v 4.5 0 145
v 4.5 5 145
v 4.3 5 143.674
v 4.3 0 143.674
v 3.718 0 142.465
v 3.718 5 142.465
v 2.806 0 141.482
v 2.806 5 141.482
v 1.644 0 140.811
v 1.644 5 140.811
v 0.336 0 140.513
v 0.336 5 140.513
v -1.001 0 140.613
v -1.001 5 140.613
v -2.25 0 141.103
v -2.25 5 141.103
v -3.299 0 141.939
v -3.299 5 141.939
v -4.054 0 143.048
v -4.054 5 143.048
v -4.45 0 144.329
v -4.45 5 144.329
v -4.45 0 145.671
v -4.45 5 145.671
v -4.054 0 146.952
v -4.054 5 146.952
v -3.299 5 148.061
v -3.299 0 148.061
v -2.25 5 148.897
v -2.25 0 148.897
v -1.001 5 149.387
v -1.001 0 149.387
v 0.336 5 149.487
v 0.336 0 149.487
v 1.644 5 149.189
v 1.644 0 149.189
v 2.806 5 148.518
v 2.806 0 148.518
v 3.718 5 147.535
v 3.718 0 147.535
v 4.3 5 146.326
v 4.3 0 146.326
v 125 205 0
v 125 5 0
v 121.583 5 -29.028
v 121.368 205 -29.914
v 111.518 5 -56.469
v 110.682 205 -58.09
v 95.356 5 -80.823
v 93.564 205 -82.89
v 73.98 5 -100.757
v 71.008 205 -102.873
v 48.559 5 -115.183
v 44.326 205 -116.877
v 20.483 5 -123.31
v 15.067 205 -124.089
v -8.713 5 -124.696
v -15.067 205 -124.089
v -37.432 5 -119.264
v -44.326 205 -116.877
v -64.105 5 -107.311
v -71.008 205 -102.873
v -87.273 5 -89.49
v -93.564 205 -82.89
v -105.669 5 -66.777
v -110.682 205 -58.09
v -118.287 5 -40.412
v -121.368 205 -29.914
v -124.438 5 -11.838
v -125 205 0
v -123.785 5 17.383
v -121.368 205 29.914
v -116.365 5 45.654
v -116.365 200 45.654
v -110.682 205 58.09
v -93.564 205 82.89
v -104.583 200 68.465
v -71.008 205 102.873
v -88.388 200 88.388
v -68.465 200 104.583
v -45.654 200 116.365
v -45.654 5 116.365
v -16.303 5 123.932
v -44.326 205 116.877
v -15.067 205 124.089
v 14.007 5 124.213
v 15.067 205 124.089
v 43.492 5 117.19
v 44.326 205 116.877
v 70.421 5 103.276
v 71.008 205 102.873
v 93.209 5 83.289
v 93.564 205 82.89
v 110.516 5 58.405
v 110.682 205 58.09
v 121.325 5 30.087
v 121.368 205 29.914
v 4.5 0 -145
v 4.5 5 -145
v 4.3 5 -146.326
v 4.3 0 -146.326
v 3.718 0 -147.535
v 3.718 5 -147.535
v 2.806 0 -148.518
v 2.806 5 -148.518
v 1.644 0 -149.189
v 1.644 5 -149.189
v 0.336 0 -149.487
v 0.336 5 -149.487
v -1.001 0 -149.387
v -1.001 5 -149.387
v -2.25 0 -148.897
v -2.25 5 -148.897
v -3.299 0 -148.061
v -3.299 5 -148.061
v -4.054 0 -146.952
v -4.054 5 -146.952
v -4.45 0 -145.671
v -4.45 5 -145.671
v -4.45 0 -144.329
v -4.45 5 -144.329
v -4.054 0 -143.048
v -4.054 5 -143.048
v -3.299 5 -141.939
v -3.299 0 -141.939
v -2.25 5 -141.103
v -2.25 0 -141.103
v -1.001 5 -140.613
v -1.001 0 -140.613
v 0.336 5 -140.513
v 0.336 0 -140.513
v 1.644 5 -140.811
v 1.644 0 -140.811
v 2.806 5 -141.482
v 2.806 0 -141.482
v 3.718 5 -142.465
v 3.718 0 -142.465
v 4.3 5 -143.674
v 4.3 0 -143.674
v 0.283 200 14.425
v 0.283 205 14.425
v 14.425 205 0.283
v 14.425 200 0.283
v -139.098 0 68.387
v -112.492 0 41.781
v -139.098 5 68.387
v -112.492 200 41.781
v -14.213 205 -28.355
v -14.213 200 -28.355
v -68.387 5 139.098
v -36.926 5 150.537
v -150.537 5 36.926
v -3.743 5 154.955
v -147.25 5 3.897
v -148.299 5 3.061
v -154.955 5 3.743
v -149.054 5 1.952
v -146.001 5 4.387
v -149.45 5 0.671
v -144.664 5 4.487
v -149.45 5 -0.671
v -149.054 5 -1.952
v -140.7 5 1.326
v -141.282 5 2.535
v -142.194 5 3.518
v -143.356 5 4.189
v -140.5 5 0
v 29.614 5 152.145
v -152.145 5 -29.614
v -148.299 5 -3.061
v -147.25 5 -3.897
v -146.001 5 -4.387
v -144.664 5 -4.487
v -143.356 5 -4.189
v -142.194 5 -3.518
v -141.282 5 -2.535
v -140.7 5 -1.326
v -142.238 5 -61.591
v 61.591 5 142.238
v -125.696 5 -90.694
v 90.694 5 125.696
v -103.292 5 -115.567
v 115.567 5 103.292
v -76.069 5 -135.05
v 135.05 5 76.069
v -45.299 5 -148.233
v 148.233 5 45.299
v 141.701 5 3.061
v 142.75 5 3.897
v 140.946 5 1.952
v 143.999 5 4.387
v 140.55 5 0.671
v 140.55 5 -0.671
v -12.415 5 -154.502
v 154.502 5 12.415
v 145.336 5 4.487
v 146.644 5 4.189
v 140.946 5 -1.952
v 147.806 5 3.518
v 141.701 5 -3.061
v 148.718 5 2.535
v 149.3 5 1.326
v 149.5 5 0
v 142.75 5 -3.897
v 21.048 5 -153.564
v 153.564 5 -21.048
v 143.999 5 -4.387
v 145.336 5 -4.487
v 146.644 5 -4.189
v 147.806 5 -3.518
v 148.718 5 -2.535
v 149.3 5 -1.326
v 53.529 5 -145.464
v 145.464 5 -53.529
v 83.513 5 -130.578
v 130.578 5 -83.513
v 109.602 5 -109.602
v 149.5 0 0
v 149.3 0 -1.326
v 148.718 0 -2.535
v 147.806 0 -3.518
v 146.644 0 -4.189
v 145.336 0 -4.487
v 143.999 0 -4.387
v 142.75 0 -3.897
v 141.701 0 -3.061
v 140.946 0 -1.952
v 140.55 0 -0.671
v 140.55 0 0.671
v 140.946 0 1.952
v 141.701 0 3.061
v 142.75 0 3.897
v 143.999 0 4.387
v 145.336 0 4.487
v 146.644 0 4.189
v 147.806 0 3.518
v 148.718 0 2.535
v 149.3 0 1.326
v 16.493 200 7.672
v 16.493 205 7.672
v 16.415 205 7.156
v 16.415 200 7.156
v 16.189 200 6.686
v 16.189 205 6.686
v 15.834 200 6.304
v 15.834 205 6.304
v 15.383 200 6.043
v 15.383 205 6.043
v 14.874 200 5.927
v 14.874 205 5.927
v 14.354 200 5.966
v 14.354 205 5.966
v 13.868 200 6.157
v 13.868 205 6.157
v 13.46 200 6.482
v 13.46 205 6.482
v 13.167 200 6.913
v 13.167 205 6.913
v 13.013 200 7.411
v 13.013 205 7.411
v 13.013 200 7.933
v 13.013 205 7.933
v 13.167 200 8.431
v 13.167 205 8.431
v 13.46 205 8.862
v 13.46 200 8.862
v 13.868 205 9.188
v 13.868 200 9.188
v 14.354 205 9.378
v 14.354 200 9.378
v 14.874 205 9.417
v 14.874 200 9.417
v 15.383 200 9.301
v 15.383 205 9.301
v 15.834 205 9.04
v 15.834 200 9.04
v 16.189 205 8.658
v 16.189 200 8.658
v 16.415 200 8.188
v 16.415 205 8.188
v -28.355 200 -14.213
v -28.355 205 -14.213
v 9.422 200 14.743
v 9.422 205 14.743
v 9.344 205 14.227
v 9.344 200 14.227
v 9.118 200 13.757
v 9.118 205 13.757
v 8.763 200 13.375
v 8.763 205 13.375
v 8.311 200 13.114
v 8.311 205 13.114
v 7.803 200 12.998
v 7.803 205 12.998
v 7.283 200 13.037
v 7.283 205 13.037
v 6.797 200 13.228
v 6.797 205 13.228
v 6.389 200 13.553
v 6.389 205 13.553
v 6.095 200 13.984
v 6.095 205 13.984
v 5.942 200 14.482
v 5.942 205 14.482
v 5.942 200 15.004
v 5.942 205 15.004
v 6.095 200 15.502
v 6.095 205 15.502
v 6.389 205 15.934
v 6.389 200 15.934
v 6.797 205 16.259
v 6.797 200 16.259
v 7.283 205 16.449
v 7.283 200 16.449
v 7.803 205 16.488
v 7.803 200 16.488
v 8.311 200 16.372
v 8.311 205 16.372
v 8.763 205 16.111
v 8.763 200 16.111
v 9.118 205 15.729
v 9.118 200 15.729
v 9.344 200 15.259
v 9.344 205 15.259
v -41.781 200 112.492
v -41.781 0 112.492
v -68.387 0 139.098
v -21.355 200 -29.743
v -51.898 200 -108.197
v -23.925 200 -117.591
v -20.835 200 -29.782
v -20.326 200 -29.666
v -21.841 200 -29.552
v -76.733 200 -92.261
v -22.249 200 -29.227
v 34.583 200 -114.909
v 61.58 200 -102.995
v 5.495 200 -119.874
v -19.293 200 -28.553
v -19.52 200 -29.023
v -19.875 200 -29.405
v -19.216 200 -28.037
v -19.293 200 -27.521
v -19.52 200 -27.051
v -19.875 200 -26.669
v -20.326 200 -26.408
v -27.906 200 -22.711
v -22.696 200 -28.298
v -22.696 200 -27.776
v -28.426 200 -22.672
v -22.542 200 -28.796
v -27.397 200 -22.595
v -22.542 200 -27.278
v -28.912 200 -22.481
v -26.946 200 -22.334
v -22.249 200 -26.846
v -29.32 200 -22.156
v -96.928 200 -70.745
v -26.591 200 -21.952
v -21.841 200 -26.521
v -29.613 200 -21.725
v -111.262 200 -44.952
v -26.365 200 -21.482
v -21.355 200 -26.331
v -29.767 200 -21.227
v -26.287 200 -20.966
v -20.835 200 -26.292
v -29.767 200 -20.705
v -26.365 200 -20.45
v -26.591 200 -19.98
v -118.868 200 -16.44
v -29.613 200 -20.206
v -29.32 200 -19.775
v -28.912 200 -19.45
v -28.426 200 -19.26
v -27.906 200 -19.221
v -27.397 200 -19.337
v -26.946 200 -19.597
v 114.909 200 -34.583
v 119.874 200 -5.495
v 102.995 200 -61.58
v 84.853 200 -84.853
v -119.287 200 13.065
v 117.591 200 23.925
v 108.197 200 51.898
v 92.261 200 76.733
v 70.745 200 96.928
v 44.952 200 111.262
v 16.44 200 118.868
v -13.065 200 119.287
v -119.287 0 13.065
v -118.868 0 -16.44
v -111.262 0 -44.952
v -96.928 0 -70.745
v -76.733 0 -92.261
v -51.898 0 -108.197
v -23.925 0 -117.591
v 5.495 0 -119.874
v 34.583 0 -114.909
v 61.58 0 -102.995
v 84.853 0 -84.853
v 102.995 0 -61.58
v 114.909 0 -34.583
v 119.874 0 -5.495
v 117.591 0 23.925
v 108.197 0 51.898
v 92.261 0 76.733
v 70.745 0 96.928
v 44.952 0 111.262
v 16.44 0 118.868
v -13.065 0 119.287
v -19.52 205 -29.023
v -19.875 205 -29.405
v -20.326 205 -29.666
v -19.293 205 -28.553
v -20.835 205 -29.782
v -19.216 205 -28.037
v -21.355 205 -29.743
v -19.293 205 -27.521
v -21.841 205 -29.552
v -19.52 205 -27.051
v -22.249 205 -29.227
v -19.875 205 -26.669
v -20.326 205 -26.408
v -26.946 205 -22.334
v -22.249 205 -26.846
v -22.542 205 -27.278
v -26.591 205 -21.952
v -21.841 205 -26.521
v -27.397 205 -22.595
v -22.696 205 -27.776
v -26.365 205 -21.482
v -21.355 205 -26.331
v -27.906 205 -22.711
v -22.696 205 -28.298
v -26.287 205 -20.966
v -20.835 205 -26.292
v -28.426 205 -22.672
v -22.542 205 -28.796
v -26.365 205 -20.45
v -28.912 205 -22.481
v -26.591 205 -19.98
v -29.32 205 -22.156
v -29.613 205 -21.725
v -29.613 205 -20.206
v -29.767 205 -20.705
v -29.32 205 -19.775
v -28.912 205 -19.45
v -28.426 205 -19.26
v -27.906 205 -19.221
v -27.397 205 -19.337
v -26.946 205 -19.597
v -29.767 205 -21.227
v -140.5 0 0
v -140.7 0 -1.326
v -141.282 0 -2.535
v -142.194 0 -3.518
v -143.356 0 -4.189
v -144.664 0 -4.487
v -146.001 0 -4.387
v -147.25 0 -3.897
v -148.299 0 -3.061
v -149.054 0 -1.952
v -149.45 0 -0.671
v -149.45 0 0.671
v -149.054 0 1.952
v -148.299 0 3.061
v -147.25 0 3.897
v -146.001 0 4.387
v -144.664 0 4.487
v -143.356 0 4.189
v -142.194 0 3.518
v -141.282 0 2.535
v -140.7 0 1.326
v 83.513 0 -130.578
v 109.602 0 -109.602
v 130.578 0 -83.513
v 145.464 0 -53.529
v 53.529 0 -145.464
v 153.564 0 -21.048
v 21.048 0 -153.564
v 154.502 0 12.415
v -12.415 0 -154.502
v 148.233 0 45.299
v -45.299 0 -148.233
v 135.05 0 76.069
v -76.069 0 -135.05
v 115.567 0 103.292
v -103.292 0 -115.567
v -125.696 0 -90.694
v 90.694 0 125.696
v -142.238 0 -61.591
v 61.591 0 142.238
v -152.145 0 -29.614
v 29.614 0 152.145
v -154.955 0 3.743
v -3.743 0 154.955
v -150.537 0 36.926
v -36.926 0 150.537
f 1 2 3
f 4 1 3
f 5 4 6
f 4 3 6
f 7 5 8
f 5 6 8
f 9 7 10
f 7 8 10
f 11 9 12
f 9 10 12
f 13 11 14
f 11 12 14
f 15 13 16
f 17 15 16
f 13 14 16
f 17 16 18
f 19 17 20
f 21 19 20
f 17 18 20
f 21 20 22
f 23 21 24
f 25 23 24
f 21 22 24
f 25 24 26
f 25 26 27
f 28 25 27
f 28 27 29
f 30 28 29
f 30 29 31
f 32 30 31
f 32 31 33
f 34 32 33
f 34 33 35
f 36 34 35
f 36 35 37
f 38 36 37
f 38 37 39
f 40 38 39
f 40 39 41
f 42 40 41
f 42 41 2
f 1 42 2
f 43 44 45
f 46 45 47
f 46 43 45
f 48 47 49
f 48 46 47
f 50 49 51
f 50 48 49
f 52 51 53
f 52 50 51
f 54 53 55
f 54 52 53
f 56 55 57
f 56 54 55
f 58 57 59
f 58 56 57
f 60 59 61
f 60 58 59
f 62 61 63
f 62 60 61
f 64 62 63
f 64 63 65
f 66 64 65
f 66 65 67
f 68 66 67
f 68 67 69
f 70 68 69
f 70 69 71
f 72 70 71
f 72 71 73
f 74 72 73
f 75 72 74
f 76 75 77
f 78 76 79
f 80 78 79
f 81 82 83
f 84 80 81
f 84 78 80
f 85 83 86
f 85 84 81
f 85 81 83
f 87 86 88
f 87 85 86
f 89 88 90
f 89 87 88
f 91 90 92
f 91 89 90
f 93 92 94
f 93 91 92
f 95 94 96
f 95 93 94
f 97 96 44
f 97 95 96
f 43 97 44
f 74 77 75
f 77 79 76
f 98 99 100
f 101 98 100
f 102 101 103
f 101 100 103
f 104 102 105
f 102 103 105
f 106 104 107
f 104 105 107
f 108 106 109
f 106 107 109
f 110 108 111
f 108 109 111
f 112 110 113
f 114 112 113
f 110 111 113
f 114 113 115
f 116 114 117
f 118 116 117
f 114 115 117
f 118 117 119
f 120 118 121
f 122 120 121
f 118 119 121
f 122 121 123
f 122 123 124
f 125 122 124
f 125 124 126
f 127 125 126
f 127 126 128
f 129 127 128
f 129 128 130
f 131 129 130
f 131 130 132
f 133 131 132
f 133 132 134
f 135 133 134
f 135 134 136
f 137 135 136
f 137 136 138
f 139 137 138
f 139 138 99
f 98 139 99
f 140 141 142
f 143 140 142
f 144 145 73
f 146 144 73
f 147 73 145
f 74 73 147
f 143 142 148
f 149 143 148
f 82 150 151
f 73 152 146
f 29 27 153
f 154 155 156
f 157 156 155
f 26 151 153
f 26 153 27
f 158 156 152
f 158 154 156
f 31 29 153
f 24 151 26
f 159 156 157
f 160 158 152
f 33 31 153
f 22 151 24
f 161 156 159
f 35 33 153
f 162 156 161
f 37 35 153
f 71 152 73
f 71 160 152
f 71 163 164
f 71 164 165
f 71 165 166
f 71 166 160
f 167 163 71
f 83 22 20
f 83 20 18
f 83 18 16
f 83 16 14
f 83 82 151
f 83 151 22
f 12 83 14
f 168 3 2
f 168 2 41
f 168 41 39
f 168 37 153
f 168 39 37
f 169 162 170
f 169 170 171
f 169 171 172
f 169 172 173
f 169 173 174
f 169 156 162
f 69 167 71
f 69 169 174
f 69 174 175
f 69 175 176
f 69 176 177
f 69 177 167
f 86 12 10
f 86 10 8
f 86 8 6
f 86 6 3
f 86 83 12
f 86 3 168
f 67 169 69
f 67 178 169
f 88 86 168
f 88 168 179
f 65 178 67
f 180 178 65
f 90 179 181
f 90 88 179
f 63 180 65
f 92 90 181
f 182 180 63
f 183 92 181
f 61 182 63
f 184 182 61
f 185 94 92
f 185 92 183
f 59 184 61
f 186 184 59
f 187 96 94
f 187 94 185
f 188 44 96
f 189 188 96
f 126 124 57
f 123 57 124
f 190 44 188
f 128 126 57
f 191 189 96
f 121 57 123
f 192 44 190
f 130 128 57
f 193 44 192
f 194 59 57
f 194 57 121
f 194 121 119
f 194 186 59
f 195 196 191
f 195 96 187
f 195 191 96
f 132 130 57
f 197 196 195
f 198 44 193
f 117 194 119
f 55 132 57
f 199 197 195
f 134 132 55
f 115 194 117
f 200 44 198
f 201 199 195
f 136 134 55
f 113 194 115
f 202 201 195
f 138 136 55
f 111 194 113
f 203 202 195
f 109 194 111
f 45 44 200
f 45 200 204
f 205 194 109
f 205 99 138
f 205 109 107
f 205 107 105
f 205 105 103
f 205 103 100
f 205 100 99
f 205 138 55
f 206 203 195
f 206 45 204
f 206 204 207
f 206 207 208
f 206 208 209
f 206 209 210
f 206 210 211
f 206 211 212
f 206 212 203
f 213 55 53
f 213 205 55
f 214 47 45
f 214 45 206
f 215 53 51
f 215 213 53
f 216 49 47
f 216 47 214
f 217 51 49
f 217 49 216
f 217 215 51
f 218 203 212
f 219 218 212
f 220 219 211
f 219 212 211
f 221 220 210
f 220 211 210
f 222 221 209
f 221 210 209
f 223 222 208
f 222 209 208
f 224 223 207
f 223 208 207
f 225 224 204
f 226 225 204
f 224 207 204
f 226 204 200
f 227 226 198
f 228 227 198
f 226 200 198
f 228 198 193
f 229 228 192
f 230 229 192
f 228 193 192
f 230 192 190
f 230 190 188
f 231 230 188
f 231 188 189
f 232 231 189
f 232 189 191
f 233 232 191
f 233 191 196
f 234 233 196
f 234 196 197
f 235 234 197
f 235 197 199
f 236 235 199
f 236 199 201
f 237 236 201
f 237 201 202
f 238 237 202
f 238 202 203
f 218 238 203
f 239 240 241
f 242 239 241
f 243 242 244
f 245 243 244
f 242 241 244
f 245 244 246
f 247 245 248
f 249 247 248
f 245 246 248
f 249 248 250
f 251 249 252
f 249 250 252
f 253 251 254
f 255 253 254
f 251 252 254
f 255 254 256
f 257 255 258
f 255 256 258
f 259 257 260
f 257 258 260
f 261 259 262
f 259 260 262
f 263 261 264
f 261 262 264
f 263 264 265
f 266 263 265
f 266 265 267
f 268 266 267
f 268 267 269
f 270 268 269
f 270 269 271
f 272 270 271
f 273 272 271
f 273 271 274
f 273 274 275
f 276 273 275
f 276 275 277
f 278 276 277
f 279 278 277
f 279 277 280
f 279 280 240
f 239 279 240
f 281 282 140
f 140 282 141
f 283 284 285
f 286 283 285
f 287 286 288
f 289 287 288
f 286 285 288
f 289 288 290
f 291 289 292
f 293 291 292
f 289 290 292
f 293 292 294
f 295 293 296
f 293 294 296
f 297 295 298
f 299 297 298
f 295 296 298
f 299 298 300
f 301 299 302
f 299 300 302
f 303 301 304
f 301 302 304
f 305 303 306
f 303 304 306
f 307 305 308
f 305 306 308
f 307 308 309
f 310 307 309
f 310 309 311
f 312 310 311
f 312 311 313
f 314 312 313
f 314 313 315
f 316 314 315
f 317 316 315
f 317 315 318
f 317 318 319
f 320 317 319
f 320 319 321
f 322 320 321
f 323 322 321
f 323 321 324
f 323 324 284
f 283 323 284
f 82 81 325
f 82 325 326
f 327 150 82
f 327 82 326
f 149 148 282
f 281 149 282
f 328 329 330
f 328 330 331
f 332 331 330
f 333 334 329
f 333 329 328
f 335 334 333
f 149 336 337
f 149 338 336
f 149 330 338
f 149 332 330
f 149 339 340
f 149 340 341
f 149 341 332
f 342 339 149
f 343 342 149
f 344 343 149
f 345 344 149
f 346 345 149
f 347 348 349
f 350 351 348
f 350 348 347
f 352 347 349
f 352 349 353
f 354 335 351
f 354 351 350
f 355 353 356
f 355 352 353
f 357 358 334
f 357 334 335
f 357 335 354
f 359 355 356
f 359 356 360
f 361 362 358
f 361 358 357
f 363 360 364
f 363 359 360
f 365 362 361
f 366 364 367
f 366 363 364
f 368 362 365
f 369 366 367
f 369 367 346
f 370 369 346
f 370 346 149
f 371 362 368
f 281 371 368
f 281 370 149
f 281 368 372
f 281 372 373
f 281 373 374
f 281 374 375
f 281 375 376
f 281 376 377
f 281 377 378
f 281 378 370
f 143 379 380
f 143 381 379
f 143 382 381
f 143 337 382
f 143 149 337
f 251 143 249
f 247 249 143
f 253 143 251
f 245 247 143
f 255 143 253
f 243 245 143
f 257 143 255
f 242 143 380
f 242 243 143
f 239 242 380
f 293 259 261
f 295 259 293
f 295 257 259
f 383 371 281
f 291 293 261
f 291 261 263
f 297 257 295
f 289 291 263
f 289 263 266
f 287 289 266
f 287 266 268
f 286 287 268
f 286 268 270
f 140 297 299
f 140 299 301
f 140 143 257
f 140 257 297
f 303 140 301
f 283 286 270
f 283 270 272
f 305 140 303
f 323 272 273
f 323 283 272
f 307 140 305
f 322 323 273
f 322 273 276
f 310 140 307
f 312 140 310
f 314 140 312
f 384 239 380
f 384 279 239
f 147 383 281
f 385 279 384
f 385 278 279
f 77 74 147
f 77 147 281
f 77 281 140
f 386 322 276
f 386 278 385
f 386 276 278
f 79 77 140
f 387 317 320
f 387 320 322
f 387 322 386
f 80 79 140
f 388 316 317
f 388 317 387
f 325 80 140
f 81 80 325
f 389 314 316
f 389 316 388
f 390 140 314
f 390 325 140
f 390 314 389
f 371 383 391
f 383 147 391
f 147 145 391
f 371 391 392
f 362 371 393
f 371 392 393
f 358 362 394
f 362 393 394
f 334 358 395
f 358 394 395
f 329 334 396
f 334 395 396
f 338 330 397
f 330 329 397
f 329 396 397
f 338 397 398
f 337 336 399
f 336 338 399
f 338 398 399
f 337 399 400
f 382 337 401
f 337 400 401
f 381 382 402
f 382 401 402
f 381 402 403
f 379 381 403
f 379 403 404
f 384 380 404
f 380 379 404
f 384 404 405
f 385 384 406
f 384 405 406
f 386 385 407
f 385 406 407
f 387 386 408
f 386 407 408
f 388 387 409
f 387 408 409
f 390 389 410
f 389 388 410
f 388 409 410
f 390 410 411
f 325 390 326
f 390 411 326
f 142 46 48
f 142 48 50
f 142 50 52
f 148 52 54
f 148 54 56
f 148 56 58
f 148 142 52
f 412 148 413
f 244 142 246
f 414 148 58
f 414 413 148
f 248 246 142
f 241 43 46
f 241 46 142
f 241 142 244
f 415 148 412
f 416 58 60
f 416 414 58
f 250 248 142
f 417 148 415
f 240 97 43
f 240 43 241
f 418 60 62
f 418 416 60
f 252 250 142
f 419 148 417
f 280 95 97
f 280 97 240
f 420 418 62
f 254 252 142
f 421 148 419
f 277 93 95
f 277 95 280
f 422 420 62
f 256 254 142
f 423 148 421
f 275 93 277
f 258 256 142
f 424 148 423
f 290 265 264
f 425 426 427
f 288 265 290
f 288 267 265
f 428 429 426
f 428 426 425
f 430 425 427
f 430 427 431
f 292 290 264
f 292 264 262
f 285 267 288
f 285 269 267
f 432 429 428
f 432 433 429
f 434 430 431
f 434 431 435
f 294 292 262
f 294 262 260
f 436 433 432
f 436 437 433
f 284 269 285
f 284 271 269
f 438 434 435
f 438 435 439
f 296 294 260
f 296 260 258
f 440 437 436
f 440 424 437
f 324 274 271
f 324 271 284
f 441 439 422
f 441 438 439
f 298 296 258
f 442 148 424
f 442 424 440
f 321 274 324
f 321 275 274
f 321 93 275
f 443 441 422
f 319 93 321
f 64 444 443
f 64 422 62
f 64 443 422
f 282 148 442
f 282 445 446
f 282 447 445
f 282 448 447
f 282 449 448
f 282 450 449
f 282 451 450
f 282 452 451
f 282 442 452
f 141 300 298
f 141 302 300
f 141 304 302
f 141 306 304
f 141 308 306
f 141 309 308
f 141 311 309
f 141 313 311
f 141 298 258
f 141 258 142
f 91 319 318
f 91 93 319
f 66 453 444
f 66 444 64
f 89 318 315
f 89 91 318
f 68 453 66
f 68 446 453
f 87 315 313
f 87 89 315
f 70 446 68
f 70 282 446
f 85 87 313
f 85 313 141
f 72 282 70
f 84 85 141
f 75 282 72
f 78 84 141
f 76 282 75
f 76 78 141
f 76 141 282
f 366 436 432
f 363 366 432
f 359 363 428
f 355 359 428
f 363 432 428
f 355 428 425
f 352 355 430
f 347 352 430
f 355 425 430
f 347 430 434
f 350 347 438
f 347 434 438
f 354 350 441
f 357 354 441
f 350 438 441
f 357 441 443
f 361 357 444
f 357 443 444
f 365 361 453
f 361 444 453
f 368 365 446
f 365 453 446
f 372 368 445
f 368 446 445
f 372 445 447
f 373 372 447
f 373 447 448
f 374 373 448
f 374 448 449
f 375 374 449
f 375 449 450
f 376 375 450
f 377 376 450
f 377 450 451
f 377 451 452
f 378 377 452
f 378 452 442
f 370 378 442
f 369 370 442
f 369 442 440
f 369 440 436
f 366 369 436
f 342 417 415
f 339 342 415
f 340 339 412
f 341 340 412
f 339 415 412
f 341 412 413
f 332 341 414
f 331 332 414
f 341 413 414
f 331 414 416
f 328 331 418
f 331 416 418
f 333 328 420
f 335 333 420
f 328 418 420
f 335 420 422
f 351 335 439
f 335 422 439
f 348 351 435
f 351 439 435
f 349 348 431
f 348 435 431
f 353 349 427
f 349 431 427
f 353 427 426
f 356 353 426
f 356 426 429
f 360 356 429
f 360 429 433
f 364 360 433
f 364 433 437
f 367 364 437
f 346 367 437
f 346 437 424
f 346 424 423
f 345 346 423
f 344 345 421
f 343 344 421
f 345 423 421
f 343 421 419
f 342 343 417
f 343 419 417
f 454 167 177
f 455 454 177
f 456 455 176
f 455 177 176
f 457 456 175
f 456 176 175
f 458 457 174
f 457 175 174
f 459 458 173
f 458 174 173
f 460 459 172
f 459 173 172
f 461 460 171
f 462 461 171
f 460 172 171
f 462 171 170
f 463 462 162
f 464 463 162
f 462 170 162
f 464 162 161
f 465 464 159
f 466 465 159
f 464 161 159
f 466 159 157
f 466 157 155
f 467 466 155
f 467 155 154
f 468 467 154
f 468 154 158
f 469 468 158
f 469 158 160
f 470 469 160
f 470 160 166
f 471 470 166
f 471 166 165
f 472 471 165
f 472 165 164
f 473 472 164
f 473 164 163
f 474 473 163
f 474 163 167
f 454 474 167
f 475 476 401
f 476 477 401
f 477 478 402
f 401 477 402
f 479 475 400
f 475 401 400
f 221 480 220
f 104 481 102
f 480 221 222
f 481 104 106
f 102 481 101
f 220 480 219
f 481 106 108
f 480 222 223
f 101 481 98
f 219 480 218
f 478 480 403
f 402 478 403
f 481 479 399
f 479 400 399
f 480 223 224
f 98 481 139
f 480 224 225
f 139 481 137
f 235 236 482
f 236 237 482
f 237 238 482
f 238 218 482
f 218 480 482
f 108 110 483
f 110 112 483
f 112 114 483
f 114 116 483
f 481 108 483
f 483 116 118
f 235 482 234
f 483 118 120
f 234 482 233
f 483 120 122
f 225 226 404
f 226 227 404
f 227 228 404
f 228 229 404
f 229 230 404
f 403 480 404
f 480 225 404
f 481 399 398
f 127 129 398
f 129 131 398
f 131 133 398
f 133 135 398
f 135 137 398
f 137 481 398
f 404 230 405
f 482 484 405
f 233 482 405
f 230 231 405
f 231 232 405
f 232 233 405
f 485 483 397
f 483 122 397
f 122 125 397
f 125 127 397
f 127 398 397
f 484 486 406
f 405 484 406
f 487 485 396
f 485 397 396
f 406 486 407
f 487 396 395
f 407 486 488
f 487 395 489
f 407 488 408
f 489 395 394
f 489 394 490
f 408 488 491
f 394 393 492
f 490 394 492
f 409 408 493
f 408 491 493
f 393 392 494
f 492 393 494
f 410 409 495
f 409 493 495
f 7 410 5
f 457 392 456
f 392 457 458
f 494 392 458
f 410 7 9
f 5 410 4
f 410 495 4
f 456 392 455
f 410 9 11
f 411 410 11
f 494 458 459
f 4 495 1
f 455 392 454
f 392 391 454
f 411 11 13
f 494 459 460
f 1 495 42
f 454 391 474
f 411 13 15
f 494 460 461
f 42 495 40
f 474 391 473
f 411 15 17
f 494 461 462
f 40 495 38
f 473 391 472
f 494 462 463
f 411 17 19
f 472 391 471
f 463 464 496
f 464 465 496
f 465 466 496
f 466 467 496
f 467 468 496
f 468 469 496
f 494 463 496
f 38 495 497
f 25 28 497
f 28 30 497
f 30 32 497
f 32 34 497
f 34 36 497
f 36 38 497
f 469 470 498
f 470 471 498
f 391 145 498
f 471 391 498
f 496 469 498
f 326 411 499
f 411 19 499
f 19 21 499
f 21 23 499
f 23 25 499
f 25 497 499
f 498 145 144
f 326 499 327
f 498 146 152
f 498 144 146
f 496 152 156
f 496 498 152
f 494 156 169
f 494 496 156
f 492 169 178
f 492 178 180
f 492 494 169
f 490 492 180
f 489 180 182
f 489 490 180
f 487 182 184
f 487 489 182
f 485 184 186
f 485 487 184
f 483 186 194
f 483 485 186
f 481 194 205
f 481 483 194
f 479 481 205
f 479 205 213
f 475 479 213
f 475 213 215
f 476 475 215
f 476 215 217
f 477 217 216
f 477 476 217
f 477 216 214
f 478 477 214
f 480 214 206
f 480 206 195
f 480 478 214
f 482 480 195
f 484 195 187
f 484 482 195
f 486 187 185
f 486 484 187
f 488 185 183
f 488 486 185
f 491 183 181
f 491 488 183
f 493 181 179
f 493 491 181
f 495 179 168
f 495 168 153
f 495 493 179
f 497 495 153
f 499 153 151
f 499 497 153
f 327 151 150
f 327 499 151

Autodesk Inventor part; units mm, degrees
ref_plane "XZ Plane" through (0, 0, 0) normal (0, 1, 0) x (-1, 0, 0)
ref_plane "XY Plane" through (0, 0, 0) normal (0, 0, 1) x (1, 0, 0)
sketch "Sketch1" plane through (0, 0, 0) normal (0, 1, 0) x (-1, 0, 0)
  circle A0 centre (0, 0) radius 120
  circle A1 centre (0, 0) radius 125
  circle A2 centre (0, 0) radius 155
  dimension "d0" = 240
  dimension "d1" = 250
  dimension "d2" = 310
extrude "Extrusion1" add sketch "Sketch1" along normal blind 205 contours A0 | A1 | A2
sketch "Sketch3" plane through (0, 205, 0) normal (0, 1, 0) x (1, 0, 0)
  circle A0 centre (0, 0) radius 155
  circle A1 centre (0, 0) radius 125
  dimension "d27" = 250
  dimension "d28" = 310
extrude "Extrusion3" cut sketch "Sketch3" against normal blind 200
sketch "Sketch4" plane through (0, 5, 0) normal (0, 1, 0) x (1, 0, 0)
  circle A0 centre (0, 145) radius 4.5
  circle A1 centre (0, 0) radius 155 projected
  line L0 (0, 155) -> (0, 125)
  circle A2 centre (0, 0) radius 125 projected
  circle A3 centre (-145, 0) radius 4.5
  line L1 (-155, 0) -> (-125, 0)
  circle A4 centre (0, -145) radius 4.5
  line L2 (0, -155) -> (0, -125)
  circle A5 centre (145, 0) radius 4.5
  line L3 (155, 0) -> (125, 0)
  dimension "d31" = 9
  dimension "d32" = 0
  dimension "d33" = 145
  dimension "d36" = 360
extrude "Extrusion4" cut sketch "Sketch4" against normal through all contours A0 L0 | L0 A0 | L3 A5 | A5 L3 | L1 A3 | A3 L1 | L2 A4 | A4 L2
sketch "Sketch5" plane through (0, 0, 0) normal (0, -1, 0) x (1, 0, 0)
  circle A0 centre (0, 0) radius 120
  dimension "d40" = 240
extrude "Extrusion5" cut sketch "Sketch5" against normal blind 200
ref_plane "Work Plane2" through (-109.6016, 0, 109.6016) normal (0.7071, 0, -0.7071) x (0, 1, 0)
ref_plane "Work Plane1" through (0, 0, 0) normal (0.7071, 0, -0.7071) x (0, 1, 0)
sketch "Sketch6" plane through (-109.6016, 0, 109.6016) normal (0.7071, 0, -0.7071) x (0, 1, 0)
  line L0 (0, -50) -> (200, -50)
  line L1 (200, -50) -> (200, 50)
  line L2 (200, 50) -> (0, 50)
  line L3 (0, 50) -> (0, -50)
  line L4 (0, 155) -> (0, -155) projected
  line L5 (-41, 0) -> (246, 0) projected
  point P0 (0, 0)
  dimension "d44" = 200
  dimension "d45" = 100
  dimension "d46" = 0
  dimension "d47" = 50
extrude "Extrusion6" cut sketch "Sketch6" along normal up to surface
sketch "Sketch7" plane through (0, 205, 0) normal (0, 1, 0) x (1, 0, 0)
  circle A0 centre (0, 0) radius 10
  line L0 (0, 0) -> (31, 0) construction
  line L1 (7.0711, 7.0711) -> (-14.2128, 28.355)
  line L2 (-14.2128, 28.355) -> (-28.355, 14.2128)
  line L3 (-28.355, 14.2128) -> (-7.0711, -7.0711)
  line L4 (-7.0711, -7.0711) -> (0.2828, -14.425)
  line L5 (-7.0711, -7.0711) -> (3.3289, -7.0711) construction
  line L6 (0.2828, -14.425) -> (14.425, -0.2828)
  line L7 (14.425, -0.2828) -> (7.0711, 7.0711)
  circle A1 centre (-28.0368, 20.9657) radius 1.75
  circle A2 centre (-20.9657, 28.0368) radius 1.75
  circle A3 centre (7.6721, -14.7432) radius 1.75
  circle A4 centre (14.7432, -7.6721) radius 1.75
  dimension "d50" = 20
  dimension "d53" = 20
  dimension "d55" = 10.4
  dimension "d56" = 45
  dimension "d57" = 30.1
  dimension "d58" = 3.5
  dimension "d61" = 5
  dimension "d65" = 10
  dimension "d68" = 50.5
  dimension "d71" = 4.55
extrude "Extrusion7" cut sketch "Sketch7" against normal through all
properties part number "mechanism_cover"
